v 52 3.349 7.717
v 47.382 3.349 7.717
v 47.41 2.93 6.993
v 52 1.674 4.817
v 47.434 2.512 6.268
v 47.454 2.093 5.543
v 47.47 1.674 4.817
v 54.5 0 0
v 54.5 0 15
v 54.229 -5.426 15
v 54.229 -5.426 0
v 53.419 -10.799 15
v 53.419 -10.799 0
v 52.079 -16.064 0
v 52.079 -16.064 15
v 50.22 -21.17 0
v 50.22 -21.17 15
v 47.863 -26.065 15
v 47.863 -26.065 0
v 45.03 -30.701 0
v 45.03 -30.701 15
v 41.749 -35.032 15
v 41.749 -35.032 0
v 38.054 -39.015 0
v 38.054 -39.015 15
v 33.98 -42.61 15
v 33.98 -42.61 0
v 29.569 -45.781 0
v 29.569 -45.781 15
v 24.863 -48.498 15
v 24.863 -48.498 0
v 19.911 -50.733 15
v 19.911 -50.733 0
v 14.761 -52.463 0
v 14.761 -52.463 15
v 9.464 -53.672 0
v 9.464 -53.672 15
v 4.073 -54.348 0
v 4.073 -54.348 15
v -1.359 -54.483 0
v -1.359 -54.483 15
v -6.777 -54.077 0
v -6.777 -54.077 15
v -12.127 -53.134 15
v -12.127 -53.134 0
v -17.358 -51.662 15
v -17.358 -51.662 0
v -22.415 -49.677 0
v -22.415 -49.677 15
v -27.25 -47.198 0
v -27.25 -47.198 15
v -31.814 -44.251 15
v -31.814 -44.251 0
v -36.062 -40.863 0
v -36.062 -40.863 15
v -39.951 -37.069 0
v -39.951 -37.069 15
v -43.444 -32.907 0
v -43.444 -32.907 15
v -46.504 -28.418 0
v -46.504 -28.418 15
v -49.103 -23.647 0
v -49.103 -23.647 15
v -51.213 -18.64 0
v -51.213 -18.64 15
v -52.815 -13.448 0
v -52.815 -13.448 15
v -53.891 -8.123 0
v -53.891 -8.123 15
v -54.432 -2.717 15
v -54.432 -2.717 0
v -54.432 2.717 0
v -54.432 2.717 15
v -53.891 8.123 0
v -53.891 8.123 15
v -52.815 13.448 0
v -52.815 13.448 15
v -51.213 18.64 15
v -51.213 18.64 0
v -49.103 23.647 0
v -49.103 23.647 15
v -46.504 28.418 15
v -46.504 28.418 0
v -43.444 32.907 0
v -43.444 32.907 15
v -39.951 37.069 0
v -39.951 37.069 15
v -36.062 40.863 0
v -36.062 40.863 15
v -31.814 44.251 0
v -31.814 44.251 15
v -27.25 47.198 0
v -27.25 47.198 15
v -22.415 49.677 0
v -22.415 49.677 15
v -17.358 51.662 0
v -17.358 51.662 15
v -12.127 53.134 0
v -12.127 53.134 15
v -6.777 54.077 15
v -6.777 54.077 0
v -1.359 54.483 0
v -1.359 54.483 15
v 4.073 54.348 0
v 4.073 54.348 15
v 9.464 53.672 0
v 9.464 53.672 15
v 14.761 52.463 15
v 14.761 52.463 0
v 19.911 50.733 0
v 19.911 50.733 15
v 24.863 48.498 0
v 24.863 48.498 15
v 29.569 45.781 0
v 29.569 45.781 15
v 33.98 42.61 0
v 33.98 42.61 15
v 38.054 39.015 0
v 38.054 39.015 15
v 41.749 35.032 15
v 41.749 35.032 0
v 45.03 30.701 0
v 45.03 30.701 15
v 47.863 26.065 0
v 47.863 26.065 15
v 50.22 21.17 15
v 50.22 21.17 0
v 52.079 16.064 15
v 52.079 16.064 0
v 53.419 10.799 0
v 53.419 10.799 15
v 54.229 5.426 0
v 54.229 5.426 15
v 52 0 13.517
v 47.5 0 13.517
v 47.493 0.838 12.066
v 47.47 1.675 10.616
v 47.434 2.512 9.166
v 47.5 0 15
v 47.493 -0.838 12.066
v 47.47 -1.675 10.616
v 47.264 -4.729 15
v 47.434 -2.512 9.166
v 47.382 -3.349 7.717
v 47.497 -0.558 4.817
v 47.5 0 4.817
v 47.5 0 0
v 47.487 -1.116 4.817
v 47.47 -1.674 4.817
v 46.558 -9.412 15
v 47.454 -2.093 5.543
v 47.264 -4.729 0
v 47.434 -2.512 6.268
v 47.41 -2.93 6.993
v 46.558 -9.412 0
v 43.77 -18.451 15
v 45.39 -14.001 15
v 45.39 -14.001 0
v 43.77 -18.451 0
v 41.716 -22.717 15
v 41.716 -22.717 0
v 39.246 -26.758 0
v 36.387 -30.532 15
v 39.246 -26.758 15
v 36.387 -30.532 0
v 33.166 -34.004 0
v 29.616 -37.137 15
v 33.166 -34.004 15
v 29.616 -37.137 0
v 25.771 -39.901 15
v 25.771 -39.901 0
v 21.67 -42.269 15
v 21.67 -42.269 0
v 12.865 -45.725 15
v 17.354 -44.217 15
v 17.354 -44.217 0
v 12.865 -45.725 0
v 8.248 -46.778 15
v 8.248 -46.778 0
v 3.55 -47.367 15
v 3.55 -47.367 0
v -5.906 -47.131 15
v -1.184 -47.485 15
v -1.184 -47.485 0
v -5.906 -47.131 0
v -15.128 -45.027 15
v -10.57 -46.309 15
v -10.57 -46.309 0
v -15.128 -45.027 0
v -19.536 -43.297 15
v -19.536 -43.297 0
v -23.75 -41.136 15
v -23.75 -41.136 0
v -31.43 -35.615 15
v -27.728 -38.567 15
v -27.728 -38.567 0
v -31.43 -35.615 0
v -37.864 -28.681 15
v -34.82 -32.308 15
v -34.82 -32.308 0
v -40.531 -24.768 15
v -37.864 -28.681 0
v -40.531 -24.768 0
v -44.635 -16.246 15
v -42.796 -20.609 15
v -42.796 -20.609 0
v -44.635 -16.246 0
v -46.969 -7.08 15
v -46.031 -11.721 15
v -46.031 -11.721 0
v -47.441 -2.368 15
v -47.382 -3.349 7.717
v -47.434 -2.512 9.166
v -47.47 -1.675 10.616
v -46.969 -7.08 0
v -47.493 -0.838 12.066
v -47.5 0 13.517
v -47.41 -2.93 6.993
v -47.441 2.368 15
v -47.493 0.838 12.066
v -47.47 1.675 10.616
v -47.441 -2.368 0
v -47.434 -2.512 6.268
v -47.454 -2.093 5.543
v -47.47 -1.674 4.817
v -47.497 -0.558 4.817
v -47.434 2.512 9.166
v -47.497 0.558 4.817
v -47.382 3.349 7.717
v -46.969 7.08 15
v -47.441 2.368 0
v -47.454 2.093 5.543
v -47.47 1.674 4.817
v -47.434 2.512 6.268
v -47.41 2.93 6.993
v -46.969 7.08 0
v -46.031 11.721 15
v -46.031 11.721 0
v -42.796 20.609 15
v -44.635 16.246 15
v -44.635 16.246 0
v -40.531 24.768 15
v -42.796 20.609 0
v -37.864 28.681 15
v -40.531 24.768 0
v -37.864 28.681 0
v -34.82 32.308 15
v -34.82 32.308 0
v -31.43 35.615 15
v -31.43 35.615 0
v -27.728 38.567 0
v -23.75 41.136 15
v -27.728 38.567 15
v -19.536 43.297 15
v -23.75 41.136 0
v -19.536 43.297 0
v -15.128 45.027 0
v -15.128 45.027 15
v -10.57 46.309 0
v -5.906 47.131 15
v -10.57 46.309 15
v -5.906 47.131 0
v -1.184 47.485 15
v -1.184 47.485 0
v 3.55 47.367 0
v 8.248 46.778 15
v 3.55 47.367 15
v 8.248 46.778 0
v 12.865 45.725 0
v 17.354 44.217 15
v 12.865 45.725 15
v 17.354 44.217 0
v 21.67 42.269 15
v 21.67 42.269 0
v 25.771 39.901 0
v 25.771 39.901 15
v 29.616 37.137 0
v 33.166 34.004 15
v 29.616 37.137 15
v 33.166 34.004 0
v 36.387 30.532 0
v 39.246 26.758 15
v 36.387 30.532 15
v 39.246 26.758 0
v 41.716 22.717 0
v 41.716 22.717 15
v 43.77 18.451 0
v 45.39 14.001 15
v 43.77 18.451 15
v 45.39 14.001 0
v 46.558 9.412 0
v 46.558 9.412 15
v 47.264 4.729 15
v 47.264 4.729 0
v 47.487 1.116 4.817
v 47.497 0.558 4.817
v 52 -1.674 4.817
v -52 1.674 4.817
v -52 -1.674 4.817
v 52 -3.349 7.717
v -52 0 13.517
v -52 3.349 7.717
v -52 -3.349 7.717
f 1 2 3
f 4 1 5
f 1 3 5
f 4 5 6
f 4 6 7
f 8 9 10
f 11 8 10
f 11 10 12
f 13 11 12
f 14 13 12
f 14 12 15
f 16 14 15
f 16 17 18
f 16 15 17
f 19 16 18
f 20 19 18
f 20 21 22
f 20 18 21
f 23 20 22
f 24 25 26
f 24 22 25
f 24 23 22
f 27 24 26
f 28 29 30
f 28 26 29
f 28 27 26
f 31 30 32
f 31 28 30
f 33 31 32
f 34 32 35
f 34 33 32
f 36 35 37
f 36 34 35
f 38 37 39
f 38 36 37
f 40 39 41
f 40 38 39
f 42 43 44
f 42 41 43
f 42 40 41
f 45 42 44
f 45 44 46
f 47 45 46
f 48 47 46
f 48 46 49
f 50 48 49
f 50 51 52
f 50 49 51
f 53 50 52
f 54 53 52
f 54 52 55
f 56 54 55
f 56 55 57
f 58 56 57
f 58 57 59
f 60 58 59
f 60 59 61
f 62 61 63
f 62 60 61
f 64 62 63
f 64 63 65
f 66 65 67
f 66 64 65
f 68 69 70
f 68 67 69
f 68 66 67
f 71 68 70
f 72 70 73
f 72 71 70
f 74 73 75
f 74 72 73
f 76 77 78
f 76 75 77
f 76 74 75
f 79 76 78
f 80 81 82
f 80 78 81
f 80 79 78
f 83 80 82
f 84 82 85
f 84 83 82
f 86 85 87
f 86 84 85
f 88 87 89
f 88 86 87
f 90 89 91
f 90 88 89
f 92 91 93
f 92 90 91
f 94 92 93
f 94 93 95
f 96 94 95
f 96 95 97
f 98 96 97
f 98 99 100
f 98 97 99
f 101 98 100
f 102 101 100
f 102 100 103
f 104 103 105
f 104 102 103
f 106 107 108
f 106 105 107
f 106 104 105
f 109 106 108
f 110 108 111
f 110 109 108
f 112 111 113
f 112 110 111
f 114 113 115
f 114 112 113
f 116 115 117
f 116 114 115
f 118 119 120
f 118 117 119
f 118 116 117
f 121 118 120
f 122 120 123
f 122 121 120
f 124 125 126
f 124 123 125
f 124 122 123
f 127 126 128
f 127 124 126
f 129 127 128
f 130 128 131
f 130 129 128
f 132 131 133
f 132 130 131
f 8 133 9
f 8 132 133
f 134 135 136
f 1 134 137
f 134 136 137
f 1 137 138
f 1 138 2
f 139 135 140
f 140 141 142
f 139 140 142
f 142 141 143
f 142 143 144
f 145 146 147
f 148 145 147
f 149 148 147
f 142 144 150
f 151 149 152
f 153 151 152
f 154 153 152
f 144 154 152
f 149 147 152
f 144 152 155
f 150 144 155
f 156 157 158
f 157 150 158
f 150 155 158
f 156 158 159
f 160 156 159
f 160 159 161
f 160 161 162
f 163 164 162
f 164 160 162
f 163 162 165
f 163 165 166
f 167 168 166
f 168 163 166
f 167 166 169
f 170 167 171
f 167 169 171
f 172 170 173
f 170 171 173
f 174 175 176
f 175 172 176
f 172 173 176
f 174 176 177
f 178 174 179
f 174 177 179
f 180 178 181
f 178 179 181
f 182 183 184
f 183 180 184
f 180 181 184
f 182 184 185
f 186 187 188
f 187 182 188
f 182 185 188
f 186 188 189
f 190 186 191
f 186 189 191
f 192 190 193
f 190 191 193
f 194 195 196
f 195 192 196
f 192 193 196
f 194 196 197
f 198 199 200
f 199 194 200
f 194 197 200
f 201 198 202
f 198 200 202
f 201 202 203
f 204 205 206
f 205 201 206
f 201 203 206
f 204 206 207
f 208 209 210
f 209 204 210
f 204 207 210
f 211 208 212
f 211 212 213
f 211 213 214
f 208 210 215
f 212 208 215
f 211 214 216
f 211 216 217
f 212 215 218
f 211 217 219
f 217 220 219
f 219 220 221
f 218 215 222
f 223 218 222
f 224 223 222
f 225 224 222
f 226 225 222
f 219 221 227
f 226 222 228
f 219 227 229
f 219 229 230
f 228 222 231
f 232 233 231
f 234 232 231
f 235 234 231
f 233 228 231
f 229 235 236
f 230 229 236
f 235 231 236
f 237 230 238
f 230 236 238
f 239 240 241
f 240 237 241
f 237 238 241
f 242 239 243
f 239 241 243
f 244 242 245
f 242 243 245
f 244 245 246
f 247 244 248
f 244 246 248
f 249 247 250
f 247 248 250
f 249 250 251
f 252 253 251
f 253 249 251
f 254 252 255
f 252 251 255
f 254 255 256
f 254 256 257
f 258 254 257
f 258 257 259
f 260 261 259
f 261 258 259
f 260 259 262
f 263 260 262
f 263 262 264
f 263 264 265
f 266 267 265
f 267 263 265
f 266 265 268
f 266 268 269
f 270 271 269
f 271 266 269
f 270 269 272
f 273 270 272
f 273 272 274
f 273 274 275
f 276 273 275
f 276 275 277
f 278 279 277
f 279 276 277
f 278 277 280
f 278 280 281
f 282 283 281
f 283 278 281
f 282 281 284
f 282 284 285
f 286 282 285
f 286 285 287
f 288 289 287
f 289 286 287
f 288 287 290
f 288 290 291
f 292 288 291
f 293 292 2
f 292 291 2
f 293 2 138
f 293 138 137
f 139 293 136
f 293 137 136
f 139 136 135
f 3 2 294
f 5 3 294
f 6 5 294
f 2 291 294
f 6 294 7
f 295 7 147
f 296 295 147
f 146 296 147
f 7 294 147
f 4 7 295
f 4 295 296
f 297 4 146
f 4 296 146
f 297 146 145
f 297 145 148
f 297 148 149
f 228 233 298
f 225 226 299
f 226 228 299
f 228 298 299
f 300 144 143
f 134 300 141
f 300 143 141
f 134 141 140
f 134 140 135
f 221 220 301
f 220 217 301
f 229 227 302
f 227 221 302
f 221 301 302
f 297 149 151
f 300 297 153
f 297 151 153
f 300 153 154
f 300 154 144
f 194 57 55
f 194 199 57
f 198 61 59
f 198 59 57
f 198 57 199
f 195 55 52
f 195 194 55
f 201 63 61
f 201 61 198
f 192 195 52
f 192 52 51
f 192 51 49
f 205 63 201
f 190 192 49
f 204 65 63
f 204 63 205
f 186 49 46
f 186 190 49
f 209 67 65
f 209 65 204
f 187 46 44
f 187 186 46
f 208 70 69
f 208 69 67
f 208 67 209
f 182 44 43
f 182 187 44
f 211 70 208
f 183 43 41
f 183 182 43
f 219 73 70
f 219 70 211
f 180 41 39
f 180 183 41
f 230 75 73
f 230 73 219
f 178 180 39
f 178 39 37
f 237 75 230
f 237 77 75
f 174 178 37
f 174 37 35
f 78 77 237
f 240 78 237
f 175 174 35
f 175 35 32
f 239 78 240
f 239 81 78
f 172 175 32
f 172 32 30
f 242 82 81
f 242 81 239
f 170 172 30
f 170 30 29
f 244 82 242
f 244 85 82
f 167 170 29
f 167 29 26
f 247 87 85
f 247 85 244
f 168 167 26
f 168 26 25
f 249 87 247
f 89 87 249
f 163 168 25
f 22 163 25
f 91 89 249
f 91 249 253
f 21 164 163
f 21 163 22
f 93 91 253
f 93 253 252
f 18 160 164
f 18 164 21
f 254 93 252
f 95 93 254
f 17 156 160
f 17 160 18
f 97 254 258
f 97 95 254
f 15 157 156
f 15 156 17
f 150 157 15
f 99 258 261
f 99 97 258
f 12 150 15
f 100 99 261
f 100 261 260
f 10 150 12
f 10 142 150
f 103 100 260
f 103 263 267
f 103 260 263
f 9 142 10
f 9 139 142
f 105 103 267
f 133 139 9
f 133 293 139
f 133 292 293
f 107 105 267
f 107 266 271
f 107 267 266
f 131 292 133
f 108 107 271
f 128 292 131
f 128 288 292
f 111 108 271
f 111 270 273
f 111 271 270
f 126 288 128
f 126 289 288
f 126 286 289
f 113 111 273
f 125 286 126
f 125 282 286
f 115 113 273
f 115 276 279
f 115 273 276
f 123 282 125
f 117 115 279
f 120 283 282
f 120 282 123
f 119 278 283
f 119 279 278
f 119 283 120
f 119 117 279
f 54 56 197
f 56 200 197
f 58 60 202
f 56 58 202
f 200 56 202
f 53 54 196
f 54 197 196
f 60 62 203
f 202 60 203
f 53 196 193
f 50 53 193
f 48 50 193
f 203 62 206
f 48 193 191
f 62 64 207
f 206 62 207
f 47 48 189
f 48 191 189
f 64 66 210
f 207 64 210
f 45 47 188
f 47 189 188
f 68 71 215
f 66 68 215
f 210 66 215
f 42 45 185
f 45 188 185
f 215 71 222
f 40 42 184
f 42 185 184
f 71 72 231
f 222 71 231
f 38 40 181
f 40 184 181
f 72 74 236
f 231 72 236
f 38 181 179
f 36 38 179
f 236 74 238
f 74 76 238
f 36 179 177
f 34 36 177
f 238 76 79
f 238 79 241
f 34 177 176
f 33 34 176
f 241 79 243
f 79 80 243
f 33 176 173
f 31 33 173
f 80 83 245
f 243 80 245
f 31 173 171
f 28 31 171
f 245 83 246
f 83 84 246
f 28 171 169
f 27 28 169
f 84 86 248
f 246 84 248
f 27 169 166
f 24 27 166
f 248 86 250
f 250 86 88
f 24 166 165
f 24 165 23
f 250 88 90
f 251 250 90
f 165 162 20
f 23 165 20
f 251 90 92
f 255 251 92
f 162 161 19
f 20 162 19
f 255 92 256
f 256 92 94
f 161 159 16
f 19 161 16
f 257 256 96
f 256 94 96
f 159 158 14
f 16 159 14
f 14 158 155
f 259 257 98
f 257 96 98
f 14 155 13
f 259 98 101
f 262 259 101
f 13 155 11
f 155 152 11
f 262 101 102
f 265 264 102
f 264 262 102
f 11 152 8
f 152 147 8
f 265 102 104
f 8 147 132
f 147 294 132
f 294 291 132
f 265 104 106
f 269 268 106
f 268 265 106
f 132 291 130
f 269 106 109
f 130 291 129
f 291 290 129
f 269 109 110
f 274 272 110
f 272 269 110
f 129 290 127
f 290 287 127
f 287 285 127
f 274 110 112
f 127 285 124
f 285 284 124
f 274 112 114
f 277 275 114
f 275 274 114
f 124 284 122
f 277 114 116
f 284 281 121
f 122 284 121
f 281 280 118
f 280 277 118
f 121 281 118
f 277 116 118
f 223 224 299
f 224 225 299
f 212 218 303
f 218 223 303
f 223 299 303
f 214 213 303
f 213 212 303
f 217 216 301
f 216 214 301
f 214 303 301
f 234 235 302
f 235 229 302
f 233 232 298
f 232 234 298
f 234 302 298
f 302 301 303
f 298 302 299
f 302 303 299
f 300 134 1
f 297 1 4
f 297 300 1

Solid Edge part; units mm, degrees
sketch "Sketch1" plane through (0, 0, 0) normal (0, 0, 1) x (1, 0, 0)
  circle A0 centre (0, 0) radius 47.5
  circle A1 centre (0, 0) radius 54.5
extrude "Protrusion1" add sketch "Sketch1" along normal blind 15
sketch "Sketch2" plane through (0, 0, 0) normal (1, 0, 0) x (0, 1, 0)
  line L0 (-3.3486, 7.7174) -> (-1.6743, 10.6174)
  line L1 (-1.6743, 4.8174) -> (-3.3486, 7.7174)
  line L2 (1.6743, 4.8174) -> (-1.6743, 4.8174)
  line L3 (3.3486, 7.7174) -> (1.6743, 4.8174)
  line L4 (1.6743, 10.6174) -> (3.3486, 7.7174)
  line L5 (0, 13.5174) -> (1.6743, 10.6174)
  line L6 (-1.6743, 10.6174) -> (0, 13.5174)
  dimension "D1" = 5.8
extrude "ExtrudedCutout_1" cut sketch "Sketch2" along normal mid plane 104
